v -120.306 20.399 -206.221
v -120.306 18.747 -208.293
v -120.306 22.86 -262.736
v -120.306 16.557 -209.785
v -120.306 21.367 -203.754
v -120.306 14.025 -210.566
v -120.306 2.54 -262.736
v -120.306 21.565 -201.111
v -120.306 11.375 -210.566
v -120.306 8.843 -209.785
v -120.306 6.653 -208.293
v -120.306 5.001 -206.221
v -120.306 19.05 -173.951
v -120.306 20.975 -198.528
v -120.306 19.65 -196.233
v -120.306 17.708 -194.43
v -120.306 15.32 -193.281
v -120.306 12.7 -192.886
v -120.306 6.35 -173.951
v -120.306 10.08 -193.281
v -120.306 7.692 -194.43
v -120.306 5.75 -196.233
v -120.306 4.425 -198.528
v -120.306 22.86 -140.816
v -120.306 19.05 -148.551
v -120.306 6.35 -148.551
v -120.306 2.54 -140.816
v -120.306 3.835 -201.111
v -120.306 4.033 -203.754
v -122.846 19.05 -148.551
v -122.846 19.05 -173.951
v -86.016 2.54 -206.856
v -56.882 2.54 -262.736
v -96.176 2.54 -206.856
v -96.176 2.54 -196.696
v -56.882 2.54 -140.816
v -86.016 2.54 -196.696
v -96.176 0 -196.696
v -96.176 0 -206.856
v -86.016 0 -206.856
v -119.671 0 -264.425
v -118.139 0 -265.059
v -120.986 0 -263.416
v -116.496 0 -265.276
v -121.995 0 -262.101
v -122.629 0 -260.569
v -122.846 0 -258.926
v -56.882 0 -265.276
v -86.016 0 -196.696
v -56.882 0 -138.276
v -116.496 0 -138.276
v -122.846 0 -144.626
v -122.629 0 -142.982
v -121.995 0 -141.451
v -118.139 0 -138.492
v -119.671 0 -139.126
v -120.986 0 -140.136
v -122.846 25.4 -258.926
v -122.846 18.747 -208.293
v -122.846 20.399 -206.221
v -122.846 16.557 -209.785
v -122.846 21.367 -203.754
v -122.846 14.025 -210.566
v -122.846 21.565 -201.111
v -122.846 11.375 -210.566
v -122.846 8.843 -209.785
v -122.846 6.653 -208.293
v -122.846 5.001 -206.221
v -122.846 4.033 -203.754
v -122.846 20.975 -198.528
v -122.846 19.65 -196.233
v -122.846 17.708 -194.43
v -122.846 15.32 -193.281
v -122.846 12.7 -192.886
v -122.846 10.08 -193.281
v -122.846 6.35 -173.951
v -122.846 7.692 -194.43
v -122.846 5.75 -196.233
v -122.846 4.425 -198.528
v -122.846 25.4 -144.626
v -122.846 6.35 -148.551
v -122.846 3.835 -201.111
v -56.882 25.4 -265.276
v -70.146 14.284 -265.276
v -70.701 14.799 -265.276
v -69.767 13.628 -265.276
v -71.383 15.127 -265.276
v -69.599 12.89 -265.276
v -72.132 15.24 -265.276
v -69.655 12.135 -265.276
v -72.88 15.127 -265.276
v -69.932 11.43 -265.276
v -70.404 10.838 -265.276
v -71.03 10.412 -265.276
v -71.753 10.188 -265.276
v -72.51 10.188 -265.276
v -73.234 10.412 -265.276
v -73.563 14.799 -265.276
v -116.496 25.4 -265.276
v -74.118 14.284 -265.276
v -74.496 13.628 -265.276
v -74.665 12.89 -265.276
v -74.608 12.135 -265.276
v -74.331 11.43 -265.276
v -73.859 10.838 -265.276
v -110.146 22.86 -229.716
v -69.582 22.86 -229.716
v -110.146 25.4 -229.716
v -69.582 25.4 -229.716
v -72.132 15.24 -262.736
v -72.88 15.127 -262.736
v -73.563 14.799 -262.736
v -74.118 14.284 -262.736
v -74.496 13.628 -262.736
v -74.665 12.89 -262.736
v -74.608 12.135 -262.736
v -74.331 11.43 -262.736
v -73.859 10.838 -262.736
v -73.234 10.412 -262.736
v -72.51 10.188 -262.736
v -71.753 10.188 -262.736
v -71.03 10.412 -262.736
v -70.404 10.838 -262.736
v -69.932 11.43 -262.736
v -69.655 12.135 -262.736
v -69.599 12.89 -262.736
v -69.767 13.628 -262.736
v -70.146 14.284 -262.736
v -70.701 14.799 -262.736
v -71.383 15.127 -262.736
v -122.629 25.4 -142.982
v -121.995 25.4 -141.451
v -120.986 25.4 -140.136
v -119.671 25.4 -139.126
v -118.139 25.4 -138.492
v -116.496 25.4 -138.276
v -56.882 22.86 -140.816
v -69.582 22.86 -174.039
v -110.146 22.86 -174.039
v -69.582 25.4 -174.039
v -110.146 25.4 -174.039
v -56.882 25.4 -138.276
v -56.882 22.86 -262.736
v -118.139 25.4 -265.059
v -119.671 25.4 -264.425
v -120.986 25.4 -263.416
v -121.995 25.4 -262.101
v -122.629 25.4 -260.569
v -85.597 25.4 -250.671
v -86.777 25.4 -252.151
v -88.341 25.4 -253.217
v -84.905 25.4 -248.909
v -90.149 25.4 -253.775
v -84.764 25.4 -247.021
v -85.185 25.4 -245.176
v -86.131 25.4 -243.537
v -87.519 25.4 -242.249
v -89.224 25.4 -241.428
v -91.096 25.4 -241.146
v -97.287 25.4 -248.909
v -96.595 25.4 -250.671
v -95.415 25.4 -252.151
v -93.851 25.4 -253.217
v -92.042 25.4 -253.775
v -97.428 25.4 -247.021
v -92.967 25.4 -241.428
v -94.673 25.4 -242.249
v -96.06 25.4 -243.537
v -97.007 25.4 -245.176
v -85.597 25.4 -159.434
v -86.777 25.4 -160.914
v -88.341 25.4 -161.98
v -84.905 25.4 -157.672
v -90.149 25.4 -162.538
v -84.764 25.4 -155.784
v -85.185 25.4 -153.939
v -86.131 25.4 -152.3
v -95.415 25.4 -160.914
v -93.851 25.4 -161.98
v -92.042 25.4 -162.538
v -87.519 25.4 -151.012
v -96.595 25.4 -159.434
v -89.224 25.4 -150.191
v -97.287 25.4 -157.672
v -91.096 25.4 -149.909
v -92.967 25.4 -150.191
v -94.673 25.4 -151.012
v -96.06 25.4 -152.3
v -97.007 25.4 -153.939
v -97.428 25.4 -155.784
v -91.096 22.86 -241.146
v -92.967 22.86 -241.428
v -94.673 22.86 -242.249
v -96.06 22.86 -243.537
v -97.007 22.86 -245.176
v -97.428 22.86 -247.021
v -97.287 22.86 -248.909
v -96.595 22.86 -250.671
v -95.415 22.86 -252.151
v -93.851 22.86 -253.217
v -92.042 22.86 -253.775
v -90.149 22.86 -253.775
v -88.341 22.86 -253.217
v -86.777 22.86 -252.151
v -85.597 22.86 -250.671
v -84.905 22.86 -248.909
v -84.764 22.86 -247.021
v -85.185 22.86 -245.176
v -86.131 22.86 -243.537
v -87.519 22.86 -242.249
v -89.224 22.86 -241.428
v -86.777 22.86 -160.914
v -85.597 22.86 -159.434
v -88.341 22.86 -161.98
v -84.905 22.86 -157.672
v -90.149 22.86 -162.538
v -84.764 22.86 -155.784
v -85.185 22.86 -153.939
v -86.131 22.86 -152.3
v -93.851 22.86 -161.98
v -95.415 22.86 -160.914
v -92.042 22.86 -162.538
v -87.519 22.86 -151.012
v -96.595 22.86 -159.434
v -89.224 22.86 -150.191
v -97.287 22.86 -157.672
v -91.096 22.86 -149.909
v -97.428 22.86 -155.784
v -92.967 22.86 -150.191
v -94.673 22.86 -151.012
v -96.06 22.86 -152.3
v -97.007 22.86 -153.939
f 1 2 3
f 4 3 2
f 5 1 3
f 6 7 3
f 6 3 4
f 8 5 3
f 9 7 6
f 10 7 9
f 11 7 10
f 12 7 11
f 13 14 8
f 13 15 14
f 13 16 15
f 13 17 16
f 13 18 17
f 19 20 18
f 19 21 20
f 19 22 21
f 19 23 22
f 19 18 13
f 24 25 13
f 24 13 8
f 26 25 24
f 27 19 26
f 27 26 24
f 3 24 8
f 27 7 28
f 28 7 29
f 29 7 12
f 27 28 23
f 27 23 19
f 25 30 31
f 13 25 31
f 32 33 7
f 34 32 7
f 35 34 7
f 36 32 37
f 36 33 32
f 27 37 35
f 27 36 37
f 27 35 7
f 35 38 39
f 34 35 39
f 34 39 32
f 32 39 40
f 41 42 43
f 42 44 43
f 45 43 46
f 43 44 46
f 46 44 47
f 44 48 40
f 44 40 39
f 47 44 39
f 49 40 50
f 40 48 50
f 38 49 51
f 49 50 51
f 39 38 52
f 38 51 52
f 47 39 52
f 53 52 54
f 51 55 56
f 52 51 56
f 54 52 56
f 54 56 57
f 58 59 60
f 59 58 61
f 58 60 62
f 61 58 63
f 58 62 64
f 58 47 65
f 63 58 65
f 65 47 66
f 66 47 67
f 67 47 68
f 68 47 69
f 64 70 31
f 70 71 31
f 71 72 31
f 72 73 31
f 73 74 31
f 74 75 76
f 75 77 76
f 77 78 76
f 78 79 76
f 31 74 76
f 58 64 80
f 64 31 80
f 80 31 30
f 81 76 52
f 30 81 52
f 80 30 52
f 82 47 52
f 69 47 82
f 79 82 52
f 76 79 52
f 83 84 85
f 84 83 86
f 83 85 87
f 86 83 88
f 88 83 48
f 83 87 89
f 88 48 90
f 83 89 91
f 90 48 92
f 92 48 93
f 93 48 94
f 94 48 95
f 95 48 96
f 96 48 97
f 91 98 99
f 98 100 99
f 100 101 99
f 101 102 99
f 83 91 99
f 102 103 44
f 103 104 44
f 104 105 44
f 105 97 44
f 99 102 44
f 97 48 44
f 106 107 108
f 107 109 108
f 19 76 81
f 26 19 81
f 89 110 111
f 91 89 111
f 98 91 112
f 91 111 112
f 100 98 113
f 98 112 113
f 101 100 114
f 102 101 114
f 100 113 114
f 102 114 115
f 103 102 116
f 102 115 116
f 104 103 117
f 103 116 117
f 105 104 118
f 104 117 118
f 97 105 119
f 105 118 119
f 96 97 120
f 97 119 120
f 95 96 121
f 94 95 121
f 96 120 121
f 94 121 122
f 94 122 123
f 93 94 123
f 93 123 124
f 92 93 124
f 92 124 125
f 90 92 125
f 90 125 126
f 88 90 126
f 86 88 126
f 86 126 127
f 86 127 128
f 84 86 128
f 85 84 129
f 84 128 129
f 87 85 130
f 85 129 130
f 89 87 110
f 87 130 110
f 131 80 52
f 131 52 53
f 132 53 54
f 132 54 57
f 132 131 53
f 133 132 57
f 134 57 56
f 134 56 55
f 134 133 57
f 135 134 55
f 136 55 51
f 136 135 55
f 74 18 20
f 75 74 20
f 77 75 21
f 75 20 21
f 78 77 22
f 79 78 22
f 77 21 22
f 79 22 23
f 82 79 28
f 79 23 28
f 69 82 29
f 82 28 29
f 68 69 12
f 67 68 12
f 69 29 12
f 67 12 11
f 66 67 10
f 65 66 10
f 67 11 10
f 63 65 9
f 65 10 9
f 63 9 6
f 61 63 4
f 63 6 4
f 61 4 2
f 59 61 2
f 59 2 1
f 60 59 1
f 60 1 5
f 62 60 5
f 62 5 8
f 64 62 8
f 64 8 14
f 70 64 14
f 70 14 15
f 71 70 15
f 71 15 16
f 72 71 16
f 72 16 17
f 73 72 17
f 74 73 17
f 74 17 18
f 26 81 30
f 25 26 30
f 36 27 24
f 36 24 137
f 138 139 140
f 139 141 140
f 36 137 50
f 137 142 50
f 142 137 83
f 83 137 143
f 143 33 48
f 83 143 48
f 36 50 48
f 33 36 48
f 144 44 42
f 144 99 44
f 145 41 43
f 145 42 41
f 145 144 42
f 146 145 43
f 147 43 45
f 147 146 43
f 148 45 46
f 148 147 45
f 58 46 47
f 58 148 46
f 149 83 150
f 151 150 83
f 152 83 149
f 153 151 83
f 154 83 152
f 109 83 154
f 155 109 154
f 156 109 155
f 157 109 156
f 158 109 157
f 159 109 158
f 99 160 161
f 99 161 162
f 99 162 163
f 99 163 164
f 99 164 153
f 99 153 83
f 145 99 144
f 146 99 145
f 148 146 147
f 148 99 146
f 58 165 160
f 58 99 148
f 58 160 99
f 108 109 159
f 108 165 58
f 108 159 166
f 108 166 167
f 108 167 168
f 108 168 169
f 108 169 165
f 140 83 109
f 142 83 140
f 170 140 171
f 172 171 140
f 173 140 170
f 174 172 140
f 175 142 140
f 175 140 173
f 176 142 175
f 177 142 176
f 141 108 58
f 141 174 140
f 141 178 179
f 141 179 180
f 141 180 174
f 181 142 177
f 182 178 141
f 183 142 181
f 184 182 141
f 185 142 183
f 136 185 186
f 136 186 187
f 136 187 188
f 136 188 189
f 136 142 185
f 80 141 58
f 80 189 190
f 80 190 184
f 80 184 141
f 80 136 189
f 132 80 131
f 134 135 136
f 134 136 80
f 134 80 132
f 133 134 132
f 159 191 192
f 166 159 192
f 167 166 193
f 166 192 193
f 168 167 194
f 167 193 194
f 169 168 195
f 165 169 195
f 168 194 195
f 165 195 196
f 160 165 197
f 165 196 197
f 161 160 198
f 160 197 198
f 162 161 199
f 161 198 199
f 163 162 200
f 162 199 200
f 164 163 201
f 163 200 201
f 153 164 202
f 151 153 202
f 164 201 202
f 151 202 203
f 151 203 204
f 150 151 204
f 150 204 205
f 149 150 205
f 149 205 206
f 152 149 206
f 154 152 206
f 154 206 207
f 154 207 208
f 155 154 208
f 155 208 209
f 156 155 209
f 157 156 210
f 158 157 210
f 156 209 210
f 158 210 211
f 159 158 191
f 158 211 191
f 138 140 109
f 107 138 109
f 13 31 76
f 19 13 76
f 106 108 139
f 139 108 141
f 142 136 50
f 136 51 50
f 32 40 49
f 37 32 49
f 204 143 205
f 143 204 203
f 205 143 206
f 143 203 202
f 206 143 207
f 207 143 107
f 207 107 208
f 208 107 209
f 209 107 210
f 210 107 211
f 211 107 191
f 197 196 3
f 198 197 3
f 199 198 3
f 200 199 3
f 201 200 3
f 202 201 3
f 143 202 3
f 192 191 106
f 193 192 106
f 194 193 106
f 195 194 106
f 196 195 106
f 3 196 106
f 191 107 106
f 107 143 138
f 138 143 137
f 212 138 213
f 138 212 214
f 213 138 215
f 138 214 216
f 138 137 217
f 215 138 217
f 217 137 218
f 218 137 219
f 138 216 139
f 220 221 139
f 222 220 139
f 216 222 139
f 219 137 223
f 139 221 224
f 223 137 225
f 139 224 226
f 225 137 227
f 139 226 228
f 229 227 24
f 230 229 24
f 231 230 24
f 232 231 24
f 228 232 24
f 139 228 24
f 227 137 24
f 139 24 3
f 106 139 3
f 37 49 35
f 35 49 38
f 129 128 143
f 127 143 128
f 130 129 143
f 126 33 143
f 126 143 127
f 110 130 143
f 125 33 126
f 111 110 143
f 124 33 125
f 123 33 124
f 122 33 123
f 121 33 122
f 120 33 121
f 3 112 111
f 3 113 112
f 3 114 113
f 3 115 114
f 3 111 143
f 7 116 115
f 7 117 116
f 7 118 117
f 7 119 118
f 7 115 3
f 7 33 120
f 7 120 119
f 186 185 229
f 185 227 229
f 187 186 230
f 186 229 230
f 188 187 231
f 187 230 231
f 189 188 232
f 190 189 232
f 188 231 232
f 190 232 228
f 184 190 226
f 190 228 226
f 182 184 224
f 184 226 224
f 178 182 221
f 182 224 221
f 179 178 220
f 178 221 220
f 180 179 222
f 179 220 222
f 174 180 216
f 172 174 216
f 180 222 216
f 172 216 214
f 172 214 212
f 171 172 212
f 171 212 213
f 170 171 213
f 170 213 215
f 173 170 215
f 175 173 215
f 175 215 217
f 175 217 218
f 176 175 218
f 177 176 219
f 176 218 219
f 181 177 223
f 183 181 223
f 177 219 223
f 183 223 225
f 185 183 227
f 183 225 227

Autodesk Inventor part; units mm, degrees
ref_plane "YZ Plane" through (0, 0, 0) normal (1, 0, 0) x (0, 1, 0)
ref_plane "XZ Plane" through (0, 0, 0) normal (0, 1, 0) x (-1, 0, 0)
ref_plane "XY Plane" through (0, 0, 0) normal (0, 0, 1) x (1, 0, 0)
sketch "Sketch1" plane through (0, 0, 0) normal (0, 1, 0) x (-1, 0, 0)
  line L0 (122.8458, -138.2757) -> (56.882, -138.2757)
  line L1 (56.882, -138.2757) -> (56.882, -265.2757)
  line L2 (56.882, -265.2757) -> (122.8458, -265.2757)
  line L3 (122.8458, -265.2757) -> (122.8458, -138.2757)
  line L4 (110.1458, -173.9373) -> (69.582, -173.9373)
  line L5 (69.582, -173.9373) -> (69.582, -229.6141)
  line L6 (69.582, -229.6141) -> (110.1458, -229.6141)
  line L7 (110.1458, -229.6141) -> (110.1458, -173.9373)
  point P0 (0, 0)
  dimension "d1" = 127
  dimension "d4" = 55.6768
  dimension "d5" = 40.5638
  dimension "d6" = 12.7
  dimension "d7" = 35.6616
  dimension "d8" = 12.7
extrude "Extrusion1" add sketch "Sketch1" along normal blind 25.4 contours L3 L2 L1 L0 | L7 L6 L5 L4
shell "Shell1" thickness 2.54 removed faces 1 at (-56.882, 8.4667, -180.609)
sketch "Sketch3" plane through (0, 25.4, 0) normal (0, 1, 0) x (1, 0, 0)
  line L0 (-110.1458, 174.0389) -> (-69.582, 174.0389)
  line L1 (-69.582, 174.0389) -> (-69.582, 229.7157)
  line L2 (-69.582, 229.7157) -> (-110.1458, 229.7157)
  line L3 (-110.1458, 229.7157) -> (-110.1458, 174.0389)
  line L4 (-122.8458, 265.2757) -> (-122.8458, 138.2757) projected
  line L5 (-56.882, 265.2757) -> (-122.8458, 265.2757) projected
  point P0 (0, 0)
  dimension "d14" = 55.6768
  dimension "d15" = 40.5638
  dimension "d16" = 12.7
  dimension "d17" = 35.56
extrude "Extrusion2" cut sketch "Sketch3" against normal blind 12.7
sketch "Sketch4" plane through (0, 25.4, 0) normal (0, 1, 0) x (1, 0, 0)
  circle A0 centre (-91.0958, 156.2589) radius 6.35
  line L0 (-69.582, 174.0389) -> (-110.1458, 174.0389) projected
  line L1 (-122.8458, 265.2757) -> (-122.8458, 138.2757) projected
  line L2 (-122.8458, 138.2757) -> (-56.882, 138.2757) projected
  line L3 (-69.582, 229.7157) -> (-69.582, 174.0389) projected
  line L4 (-69.582, 174.0389) -> (-110.1458, 174.0389) projected
  line L5 (-110.1458, 174.0389) -> (-110.1458, 229.7157) projected
  line L6 (-110.1458, 229.7157) -> (-69.582, 229.7157) projected
  line L7 (-122.8458, 138.2757) -> (-56.882, 138.2757) projected
  line L8 (-56.882, 138.2757) -> (-56.882, 265.2757) projected
  line L9 (-56.882, 265.2757) -> (-122.8458, 265.2757) projected
  line L10 (-122.8458, 265.2757) -> (-122.8458, 138.2757) projected
  circle A1 centre (-91.0958, 247.4957) radius 6.35
  point P0 (0, 0)
  dimension "d20" = 12.7
  dimension "d21" = 17.78
  dimension "d22" = 31.75
  dimension "d23" = 12.7
  dimension "d24" = 17.78
  dimension "d25" = 31.75
hole "Hole1" at (-91.0958, 25.4, -156.2589) at (-91.0958, 25.4, -247.4957) direction (0, -1, 0) diameter 12.7 depth 12.7 tip angle 118
sketch "Sketch5" plane through (0, 0, 0) normal (0, -1, 0) x (1, 0, 0)
  line L0 (-122.8458, -265.2757) -> (-122.8458, -138.2757) projected
  line L1 (-122.8458, -138.2757) -> (-56.882, -138.2757) projected
  line L2 (-122.8458, -265.2757) -> (-122.8458, -138.2757) projected
  line L3 (-56.882, -265.2757) -> (-122.8458, -265.2757) projected
  line L4 (-56.882, -138.2757) -> (-56.882, -265.2757) projected
  line L5 (-96.1758, -206.8557) -> (-86.0158, -206.8557)
  line L6 (-86.0158, -206.8557) -> (-86.0158, -196.6957)
  line L7 (-86.0158, -196.6957) -> (-96.1758, -196.6957)
  line L8 (-96.1758, -196.6957) -> (-96.1758, -206.8557)
  point P0 (0, 0)
  dimension "d33" = 10.16
  dimension "d34" = 10.16
  dimension "d35" = 26.67
  dimension "d36" = 58.42
extrude "Extrusion3" cut sketch "Sketch5" against normal blind 12.7 contours L8 L7 L6 L5
sketch "Sketch6" plane through (-122.8458, 0, -265.2757) normal (-1, 0, 0) x (0, 0, 1)
  circle A0 centre (63.5, 12.7) radius 8.89
  line L0 (127, 0) -> (127, 25.4) projected
  line L1 (0, 25.4) -> (127, 25.4) projected
  line L2 (116.7244, 19.05) -> (91.3244, 19.05)
  line L3 (91.3244, 19.05) -> (91.3244, 6.35)
  line L4 (91.3244, 6.35) -> (116.7244, 6.35)
  line L5 (116.7244, 6.35) -> (116.7244, 19.05)
  line L6 (0, 0) -> (127, 0) projected
  point P0 (265.2757, 0)
  dimension "d39" = 17.78
  dimension "d40" = 63.5
  dimension "d41" = 12.7
  dimension "d49" = 12.7
  dimension "d50" = 25.4
  dimension "d51" = 6.35
hole "Hole2" at (-122.8458, 12.7, -201.7757) direction (1, 0, 0) diameter 17.78 depth 12.7 tip angle 118
extrude "Extrusion4" cut sketch "Sketch6" against normal blind 12.7 contours L5 L4 L3 L2
sketch "Sketch7" plane through (-56.882, 0, -265.2757) normal (0, 0, -1) x (-1, 0, 0)
  circle A0 centre (15.2497, 12.7) radius 2.54
  line L0 (0, 25.4) -> (65.9638, 25.4) projected
  point P0 (-56.882, 0)
  dimension "d54" = 5.08
  dimension "d55" = 12.7
hole "Hole3" at (-72.1317, 12.7, -265.2757) direction (0, 0, 1) diameter 5.08 depth 12.7 tip angle 118
fillet "Fillet1" radius 6.35 2 edges at (-122.8458, 12.7, -265.2757) (-122.8458, 12.7, -138.2757)
equation "\"d7\" = -0.5 * d4 + 0.5 * d1"
equation "\"d8\" = d6"
properties part number "prototype1_third_eye_not_blind"
